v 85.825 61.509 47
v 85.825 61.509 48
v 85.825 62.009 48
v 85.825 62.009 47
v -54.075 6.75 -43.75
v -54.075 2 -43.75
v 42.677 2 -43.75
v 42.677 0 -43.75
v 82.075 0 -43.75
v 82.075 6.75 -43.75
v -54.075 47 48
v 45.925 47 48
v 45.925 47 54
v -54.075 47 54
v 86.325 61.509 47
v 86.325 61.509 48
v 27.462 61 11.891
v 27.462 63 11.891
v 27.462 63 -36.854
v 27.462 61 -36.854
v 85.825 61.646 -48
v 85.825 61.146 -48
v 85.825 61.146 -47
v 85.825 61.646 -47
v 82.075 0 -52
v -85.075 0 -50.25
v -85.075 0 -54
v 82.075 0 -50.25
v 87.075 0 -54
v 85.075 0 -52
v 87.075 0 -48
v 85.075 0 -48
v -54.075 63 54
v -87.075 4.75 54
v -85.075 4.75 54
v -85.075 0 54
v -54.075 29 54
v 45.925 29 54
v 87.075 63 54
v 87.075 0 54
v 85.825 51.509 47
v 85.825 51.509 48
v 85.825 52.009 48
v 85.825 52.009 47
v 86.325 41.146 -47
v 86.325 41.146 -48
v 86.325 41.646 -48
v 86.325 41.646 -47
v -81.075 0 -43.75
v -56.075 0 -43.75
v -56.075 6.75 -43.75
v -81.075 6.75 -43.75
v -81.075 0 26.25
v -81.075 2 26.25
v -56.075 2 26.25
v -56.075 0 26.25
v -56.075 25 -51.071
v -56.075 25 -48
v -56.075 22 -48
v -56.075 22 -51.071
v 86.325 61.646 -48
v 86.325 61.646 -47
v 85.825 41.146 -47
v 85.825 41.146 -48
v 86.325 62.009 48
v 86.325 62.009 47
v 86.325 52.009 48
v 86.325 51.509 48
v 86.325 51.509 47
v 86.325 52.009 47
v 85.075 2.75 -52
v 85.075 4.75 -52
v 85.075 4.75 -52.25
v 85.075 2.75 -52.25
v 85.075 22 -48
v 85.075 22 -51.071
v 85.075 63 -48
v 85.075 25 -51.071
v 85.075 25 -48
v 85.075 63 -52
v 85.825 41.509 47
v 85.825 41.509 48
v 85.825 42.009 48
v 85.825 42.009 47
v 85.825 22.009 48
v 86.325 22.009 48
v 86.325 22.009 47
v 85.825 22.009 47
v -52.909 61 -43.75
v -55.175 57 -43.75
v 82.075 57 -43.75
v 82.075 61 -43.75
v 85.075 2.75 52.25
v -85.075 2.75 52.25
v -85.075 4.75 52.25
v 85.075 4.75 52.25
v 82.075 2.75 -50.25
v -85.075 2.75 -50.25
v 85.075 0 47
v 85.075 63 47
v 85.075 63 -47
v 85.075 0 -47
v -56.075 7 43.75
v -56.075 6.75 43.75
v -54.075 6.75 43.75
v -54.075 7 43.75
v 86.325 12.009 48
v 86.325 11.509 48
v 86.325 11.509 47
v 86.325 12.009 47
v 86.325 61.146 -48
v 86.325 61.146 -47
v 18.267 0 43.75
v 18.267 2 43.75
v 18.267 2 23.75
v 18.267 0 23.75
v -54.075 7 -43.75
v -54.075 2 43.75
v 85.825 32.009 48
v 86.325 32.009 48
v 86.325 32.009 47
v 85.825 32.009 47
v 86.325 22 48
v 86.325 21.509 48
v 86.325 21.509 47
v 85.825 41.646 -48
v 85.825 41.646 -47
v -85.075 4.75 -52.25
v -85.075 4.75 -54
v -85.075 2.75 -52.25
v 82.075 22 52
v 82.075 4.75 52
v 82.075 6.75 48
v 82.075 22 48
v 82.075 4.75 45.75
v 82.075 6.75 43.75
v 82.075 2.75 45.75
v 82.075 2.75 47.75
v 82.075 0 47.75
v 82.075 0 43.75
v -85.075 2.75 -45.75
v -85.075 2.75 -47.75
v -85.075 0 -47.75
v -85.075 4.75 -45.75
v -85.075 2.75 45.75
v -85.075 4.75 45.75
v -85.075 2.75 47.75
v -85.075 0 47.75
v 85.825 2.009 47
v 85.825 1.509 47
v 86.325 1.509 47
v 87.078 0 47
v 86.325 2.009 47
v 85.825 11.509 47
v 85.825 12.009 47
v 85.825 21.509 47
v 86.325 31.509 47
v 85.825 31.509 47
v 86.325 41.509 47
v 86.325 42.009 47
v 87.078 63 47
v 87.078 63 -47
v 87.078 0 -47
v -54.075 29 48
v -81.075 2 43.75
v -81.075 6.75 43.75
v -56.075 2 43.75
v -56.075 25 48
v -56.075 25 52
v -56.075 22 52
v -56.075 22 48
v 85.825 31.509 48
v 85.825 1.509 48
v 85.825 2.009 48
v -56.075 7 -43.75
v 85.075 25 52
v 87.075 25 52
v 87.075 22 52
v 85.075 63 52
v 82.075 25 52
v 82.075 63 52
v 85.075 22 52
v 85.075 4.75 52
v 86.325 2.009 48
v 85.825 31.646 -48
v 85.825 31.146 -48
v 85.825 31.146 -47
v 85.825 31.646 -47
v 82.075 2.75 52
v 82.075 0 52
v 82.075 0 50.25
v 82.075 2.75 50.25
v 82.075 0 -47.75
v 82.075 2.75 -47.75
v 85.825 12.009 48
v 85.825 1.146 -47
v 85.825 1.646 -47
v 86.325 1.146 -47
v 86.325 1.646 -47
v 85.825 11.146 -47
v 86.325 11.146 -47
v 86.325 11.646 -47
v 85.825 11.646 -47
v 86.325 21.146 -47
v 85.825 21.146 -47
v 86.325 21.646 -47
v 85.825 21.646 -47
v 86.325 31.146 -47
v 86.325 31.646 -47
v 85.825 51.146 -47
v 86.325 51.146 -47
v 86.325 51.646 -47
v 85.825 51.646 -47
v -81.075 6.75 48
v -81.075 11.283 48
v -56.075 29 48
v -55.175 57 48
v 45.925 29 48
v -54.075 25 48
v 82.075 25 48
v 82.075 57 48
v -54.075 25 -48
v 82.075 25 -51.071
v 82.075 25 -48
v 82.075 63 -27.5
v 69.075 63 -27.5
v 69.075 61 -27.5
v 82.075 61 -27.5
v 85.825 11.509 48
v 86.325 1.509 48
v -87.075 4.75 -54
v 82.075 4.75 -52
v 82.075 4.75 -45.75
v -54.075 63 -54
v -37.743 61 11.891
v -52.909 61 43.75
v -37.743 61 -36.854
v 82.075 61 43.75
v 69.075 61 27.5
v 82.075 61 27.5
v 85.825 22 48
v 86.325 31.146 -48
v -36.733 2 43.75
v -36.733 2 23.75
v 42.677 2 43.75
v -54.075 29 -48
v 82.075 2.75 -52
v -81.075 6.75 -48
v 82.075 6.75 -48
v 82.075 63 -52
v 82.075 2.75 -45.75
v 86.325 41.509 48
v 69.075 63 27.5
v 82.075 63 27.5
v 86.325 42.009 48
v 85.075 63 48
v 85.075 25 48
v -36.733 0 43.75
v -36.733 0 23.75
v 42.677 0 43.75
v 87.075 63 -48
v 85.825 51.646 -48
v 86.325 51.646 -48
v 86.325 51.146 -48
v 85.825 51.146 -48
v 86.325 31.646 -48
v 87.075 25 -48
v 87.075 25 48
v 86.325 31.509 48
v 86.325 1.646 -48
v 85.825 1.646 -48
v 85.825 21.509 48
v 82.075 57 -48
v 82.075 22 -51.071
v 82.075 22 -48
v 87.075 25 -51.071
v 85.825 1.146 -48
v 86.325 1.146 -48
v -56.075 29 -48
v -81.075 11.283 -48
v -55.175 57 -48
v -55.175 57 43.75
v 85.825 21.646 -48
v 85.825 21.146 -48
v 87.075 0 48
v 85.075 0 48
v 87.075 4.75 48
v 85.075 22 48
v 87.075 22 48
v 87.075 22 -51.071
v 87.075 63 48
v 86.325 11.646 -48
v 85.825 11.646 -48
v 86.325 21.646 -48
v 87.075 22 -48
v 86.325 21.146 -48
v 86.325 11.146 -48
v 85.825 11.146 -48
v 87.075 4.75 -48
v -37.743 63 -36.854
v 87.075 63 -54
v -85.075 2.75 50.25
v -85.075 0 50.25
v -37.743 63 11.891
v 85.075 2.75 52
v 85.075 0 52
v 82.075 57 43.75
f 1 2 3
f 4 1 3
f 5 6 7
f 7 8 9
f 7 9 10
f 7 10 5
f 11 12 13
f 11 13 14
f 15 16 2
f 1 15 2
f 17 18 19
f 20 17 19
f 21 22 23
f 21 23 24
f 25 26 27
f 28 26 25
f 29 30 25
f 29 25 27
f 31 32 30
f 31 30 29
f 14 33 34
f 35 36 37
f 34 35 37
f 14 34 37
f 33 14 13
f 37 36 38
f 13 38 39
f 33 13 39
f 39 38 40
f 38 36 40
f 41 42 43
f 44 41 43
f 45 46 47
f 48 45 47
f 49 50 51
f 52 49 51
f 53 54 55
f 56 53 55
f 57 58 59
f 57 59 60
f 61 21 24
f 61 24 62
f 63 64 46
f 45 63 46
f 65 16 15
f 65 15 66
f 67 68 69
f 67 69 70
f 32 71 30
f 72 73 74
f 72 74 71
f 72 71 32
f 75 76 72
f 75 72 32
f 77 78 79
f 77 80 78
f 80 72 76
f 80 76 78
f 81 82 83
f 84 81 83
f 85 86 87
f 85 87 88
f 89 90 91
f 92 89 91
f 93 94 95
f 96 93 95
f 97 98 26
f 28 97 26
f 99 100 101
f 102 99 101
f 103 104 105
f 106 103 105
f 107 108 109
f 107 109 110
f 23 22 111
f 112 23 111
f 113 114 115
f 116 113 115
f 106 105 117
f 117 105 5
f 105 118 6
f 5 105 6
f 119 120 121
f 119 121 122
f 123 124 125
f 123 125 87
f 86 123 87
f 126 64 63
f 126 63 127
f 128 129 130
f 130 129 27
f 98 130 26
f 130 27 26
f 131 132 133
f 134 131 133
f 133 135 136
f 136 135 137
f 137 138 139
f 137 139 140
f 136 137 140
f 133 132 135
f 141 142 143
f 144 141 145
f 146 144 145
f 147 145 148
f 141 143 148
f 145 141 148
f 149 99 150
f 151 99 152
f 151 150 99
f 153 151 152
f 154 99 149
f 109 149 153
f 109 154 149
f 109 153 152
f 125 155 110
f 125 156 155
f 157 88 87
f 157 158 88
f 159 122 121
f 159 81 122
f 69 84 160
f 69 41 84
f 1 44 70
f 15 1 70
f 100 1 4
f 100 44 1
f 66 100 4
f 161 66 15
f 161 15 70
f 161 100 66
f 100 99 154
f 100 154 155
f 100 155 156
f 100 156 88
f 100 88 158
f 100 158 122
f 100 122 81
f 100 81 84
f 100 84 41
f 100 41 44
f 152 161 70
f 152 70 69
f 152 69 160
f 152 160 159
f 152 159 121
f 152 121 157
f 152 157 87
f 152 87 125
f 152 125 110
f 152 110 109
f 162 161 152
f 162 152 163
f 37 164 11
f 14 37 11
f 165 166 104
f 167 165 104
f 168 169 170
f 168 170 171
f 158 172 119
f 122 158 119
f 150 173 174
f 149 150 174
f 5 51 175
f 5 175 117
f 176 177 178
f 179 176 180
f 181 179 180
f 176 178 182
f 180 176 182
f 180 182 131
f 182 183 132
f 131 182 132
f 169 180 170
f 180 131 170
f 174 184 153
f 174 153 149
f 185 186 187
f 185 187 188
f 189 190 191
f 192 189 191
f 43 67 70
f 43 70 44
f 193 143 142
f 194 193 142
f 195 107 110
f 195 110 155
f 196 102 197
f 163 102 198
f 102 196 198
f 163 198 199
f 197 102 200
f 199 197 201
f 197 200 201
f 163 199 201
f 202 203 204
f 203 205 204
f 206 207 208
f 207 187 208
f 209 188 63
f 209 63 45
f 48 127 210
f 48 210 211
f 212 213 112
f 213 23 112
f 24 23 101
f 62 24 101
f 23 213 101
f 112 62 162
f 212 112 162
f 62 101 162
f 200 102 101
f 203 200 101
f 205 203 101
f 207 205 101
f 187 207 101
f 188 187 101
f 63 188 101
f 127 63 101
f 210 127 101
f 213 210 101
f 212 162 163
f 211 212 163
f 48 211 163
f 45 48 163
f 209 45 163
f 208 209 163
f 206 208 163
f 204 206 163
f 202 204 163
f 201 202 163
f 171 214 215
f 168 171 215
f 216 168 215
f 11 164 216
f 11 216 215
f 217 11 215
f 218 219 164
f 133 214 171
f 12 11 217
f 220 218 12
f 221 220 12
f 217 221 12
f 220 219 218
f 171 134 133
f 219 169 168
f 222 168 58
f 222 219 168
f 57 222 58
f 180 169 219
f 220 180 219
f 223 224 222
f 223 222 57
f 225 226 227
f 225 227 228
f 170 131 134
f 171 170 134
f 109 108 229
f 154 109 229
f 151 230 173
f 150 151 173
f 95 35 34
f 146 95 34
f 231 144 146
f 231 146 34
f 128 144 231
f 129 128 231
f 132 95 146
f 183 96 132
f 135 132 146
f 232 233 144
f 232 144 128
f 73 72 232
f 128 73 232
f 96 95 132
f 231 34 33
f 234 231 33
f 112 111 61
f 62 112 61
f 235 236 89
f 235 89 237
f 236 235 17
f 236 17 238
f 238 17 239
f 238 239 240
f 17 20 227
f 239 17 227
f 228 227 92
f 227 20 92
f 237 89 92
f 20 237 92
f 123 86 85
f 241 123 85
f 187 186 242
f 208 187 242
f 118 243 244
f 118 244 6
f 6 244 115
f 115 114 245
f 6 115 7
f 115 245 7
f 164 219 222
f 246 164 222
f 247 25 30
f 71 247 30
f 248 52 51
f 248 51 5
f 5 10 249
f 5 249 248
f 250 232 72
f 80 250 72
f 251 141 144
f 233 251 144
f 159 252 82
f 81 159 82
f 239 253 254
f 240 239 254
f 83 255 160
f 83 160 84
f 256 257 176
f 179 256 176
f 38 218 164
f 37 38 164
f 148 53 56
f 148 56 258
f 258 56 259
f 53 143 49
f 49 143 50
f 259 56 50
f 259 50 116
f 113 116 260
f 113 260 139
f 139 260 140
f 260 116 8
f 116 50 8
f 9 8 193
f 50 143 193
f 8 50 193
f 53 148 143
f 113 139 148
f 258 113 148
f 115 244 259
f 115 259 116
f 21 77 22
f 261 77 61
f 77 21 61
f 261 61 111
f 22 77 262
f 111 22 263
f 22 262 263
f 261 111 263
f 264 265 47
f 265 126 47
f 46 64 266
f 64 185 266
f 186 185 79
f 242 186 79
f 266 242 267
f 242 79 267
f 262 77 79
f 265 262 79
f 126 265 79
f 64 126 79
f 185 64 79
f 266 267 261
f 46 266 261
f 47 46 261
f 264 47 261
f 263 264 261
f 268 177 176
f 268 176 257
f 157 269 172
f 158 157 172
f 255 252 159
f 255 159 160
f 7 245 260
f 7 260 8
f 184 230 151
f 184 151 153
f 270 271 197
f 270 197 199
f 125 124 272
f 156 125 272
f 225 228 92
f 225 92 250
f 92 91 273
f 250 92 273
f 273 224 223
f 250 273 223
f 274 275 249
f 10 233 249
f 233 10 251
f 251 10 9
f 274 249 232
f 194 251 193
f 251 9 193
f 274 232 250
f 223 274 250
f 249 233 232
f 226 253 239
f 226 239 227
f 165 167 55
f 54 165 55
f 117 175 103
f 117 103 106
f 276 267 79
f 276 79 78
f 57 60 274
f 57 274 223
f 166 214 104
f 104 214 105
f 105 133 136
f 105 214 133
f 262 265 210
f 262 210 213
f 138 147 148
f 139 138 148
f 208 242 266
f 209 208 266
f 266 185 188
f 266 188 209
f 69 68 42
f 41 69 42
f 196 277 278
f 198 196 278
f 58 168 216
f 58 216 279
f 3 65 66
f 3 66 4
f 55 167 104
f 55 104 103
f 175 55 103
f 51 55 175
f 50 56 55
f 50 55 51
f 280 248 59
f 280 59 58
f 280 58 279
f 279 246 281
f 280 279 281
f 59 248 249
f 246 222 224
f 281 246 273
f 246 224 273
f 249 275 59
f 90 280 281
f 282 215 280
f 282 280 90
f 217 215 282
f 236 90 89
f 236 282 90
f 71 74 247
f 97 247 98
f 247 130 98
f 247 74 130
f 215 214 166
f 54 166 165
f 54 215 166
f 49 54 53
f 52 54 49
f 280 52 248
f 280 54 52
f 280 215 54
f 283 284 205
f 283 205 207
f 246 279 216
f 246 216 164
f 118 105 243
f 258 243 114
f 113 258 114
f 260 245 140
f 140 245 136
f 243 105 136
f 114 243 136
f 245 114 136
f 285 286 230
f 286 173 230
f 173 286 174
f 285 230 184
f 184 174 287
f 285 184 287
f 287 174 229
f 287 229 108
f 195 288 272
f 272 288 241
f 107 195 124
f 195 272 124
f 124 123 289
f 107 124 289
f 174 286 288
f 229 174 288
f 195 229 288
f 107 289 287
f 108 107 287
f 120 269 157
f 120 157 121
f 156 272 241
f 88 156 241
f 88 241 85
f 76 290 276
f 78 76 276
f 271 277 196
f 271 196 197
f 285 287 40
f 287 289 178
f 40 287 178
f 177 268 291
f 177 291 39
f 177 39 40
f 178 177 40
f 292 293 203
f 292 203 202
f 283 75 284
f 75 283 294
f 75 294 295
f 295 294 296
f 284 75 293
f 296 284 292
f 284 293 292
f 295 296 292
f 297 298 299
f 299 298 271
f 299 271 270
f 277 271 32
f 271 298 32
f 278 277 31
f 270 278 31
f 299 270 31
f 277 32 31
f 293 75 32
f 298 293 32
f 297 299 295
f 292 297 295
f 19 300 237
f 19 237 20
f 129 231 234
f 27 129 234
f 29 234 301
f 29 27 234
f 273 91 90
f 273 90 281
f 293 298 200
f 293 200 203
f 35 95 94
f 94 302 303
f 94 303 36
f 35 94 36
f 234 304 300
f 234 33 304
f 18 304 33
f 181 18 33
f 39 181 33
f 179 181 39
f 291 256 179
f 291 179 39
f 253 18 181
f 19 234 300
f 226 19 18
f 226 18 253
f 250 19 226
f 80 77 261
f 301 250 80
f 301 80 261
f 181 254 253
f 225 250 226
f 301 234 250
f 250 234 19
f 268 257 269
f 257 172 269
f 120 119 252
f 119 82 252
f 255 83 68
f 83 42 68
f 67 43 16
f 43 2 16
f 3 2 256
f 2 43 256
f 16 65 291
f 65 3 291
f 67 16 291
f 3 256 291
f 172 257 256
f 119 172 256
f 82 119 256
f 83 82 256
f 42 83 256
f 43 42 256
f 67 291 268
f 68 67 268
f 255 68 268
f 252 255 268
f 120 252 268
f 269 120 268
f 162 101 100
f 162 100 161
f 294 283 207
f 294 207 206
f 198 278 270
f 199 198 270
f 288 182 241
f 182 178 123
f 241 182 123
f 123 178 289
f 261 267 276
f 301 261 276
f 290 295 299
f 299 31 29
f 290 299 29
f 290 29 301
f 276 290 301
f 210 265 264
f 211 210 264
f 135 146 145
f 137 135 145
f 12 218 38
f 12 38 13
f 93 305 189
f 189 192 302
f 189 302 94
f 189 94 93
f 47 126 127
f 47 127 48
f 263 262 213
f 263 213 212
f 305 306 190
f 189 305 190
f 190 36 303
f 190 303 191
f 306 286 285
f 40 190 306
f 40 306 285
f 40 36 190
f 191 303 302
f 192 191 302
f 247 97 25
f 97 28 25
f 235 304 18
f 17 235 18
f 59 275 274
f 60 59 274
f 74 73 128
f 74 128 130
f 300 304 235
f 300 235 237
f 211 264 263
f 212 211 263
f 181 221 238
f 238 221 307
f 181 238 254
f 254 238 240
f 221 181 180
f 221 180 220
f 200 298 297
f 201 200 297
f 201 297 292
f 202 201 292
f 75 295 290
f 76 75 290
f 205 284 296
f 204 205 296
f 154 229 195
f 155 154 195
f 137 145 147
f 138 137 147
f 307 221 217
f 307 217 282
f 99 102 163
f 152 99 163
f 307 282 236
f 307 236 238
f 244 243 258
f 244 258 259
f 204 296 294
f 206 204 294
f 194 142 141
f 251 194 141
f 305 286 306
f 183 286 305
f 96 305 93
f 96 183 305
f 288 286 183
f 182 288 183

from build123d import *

# Parameters (mm, degrees)
SKETCH_1_W           = 174.15
SKETCH_1_H           = 108
EXTRUDE_1_DEPTH      = 63
CUT_EXTRUDE_2_DEPTH  = 174.15
CUT_EXTRUDE_3_REACH  = 122.279
SKETCH_6_W           = 2
SKETCH_6_H           = 108
SKETCH_7_W           = 96
SKETCH_7_H           = 50.25
CUT_EXTRUDE_5_DEPTH  = 168.15
SKETCH_8_W           = 87.5
SKETCH_8_H           = 4.75
CUT_EXTRUDE_6_DEPTH  = 168.15
SKETCH_10_W          = 168.15
SKETCH_10_H          = 87.5
CUT_EXTRUDE_8_DEPTH  = 59
SKETCH_12_W          = 168.15
SKETCH_12_H          = 96
EXTRUDE_2_DEPTH      = 2
SKETCH_15_W          = 25
SKETCH_15_H          = 70
SKETCH_15_W_2        = 55
SKETCH_15_H_2        = 20
SKETCH_15_W_3        = 44.398131355
SKETCH_15_H_3        = 87.5
CUT_EXTRUDE_9_DEPTH  = 2
SKETCH_16_W          = 25
SKETCH_16_H          = 96
SKETCH_16_W_2        = 32.283516817
CUT_EXTRUDE_10_DEPTH = 2
SKETCH_17_W          = 2
SKETCH_17_H          = 96
EXTRUDE_3_DEPTH      = 5
SKETCH_18_W          = 2
SKETCH_18_H          = 87.5
EXTRUDE_4_DEPTH      = 5
SKETCH_19_W          = 100
SKETCH_19_H          = 18
CUT_EXTRUDE_11_DEPTH = 6
CUT_EXTRUDE_12_REACH = 154.365
EXTRUDE_5_REACH      = 154.365
SKETCH_23_W          = 65.205598619
SKETCH_23_H          = 48.744694075
CUT_EXTRUDE_13_DEPTH = 2
CUT_EXTRUDE_START    = -63
CUT_EXTRUDE_14_DEPTH = 63
SKETCH_28_W          = 2
SKETCH_28_H          = 4.25
EXTRUDE_6_DEPTH      = 4.75
SKETCH_31_W          = 13
SKETCH_31_H          = 55
CUT_EXTRUDE_15_DEPTH = 10
SKETCH_34_W          = 103.070926165
SKETCH_34_H          = 3
CUT_EXTRUDE_16_DEPTH = 143.15
SKETCH_37_W          = 0.5
SKETCH_37_H          = 0.5
EXTRUDE_7_DEPTH      = 1
EXTRUDE_7_2_DEPTH    = 1
EXTRUDE_7_3_DEPTH    = 1
EXTRUDE_7_4_DEPTH    = 1
EXTRUDE_7_5_DEPTH    = 1
EXTRUDE_7_6_DEPTH    = 1
EXTRUDE_7_7_DEPTH    = 1
SKETCH_40_W          = 0.5
SKETCH_40_H          = 0.5
EXTRUDE_8_DEPTH      = 1
SKETCH_42_W          = 2.002594571
SKETCH_42_H          = 94
EXTRUDE_9_DEPTH      = 63


with BuildPart() as part:
    # 스케치1 → 보스-돌출1 (new body)
    with BuildSketch(Plane(origin=(0, 0, 0), x_dir=(1, 0, 0), z_dir=(0, 1, 0))):
        Rectangle(SKETCH_1_W, SKETCH_1_H)
    extrude(amount=EXTRUDE_1_DEPTH)

    # 스케치5 → 컷-돌출2 (cut)
    with BuildSketch(Plane.ZY.offset(87.075)):
        Polygon((-48, 0), (-47.75, 0), (-47.75, 2.75), (-45.75, 2.75), (-45.75, 4.75), (-52.25, 4.75), (-52.25, 2.75), (-50.25, 2.75), (-50.25, 0), (-50, 0), (-50, 3), (-52, 3), (-52, 4.5), (-46, 4.5), (-46, 3), (-48, 3), align=None)
        Polygon((-50, 0), (-48, 0), (-48, 3), (-46, 3), (-46, 4.5), (-52, 4.5), (-52, 3), (-50, 3), align=None)
        Polygon((50, 3), (50, 0), (50.25, 0), (50.25, 2.75), (52.25, 2.75), (52.25, 4.75), (45.75, 4.75), (45.75, 2.75), (47.75, 2.75), (47.75, 0), (48, 0), (48, 3), (46, 3), (46, 4.5), (52, 4.5), (52, 3), align=None)
        Polygon((48, 0), (50, 0), (50, 3), (52, 3), (52, 4.5), (46, 4.5), (46, 3), (48, 3), align=None)
    extrude(amount=-CUT_EXTRUDE_2_DEPTH, mode=Mode.SUBTRACT)

    # 컷-돌출3: up to this face of the body (flat: up to its plane)
    cut_extrude_3_end = Plane(part.part.faces().sort_by_distance((0, 4.75, 49))[0])
    # 스케치6 → 컷-돌출3 (cut, up to the picked face)
    with BuildSketch(Plane.XZ, mode=Mode.PRIVATE) as cut_extrude_3_sk1:
        with Locations((-86.075, 0)):
            Rectangle(SKETCH_6_W, SKETCH_6_H)
    cut_extrude_3_tool1 = split(extrude(cut_extrude_3_sk1.sketch, amount=-CUT_EXTRUDE_3_REACH, mode=Mode.PRIVATE), bisect_by=cut_extrude_3_end, keep=Keep.BOTH, mode=Mode.PRIVATE)
    add(cut_extrude_3_tool1.solids().sort_by(Axis((-86.075, 0, 0), (0, 1, 0)))[0], mode=Mode.SUBTRACT)

    # 스케치7 → 컷-돌출5 (cut)
    with BuildSketch(Plane(origin=(87.075, 0, 0), x_dir=(0, 0, -1), z_dir=(1, 0, 0))):
        with Locations((0, 31.875)):
            Rectangle(SKETCH_7_W, SKETCH_7_H)
    extrude(amount=-CUT_EXTRUDE_5_DEPTH, mode=Mode.SUBTRACT)

    # 스케치8 → 컷-돌출6 (cut)
    with BuildSketch(Plane(origin=(87.075, 0, 0), x_dir=(0, 0, -1), z_dir=(1, 0, 0))):
        with Locations((0, 4.375)):
            Rectangle(SKETCH_8_W, SKETCH_8_H)
    extrude(amount=-CUT_EXTRUDE_6_DEPTH, mode=Mode.SUBTRACT)

    # 스케치10 → 컷-돌출8 (cut)
    with BuildSketch(Plane(origin=(0, 2, 0), x_dir=(1, 0, 0), z_dir=(0, 1, 0))):
        with Locations((3, 0)):
            Rectangle(SKETCH_10_W, SKETCH_10_H)
    extrude(amount=CUT_EXTRUDE_8_DEPTH, mode=Mode.SUBTRACT)

    # 스케치12 → 보스-돌출2 (add)
    with BuildSketch(Plane(origin=(0, 24, 0), x_dir=(-1, 0, 0), z_dir=(0, -1, 0))):
        with Locations((-3, 0)):
            Rectangle(SKETCH_12_W, SKETCH_12_H)
    extrude(amount=EXTRUDE_2_DEPTH)

    # 스케치15 → 컷-돌출9 (cut)
    with BuildSketch(Plane(origin=(0, 2, 0), x_dir=(1, 0, 0), z_dir=(0, 1, 0))):
        with Locations((-68.575, 8.75)):
            Rectangle(SKETCH_15_W, SKETCH_15_H)
        with Locations((-9.233175572, -33.75)):
            Rectangle(SKETCH_15_W_2, SKETCH_15_H_2)
        with Locations((64.875934323, 0)):
            Rectangle(SKETCH_15_W_3, SKETCH_15_H_3)
    extrude(amount=-CUT_EXTRUDE_9_DEPTH, mode=Mode.SUBTRACT)

    # 스케치16 → 컷-돌출10 (cut)
    with BuildSketch(Plane(origin=(0, 24, 0), x_dir=(1, 0, 0), z_dir=(0, 1, 0))):
        with Locations((-68.575, 0)):
            Rectangle(SKETCH_16_W, SKETCH_16_H)
        with Locations((70.933241592, 0)):
            Rectangle(SKETCH_16_W_2, SKETCH_16_H)
    extrude(amount=-CUT_EXTRUDE_10_DEPTH, mode=Mode.SUBTRACT)

    # 스케치17 → 보스-돌출3 (add)
    with BuildSketch(Plane(origin=(0, 24, 0), x_dir=(1, 0, 0), z_dir=(0, 1, 0))):
        with Locations((-55.075, 0)):
            Rectangle(SKETCH_17_W, SKETCH_17_H)
    extrude(amount=EXTRUDE_3_DEPTH)

    # 스케치18 → 보스-돌출4 (add)
    with BuildSketch(Plane(origin=(0, 2, 0), x_dir=(1, 0, 0), z_dir=(0, 1, 0))):
        with Locations((-55.075, 0)):
            Rectangle(SKETCH_18_W, SKETCH_18_H)
    extrude(amount=EXTRUDE_4_DEPTH)

    # 스케치19 → 컷-돌출11 (cut)
    with BuildSketch(Plane(origin=(0, 0, 48), x_dir=(-1, 0, 0), z_dir=(0, 0, -1))):
        with Locations((4.075, 38)):
            Rectangle(SKETCH_19_W, SKETCH_19_H)
    extrude(amount=-CUT_EXTRUDE_11_DEPTH, mode=Mode.SUBTRACT)

    # 컷-돌출12: up to this face of the body (flat: up to its plane)
    cut_extrude_12_end = Plane(part.part.faces().sort_by_distance((0.074595533, 31.525240719, -54))[0])
    # 스케치20 → 컷-돌출12 (cut, up to the picked face)
    with BuildSketch(Plane.XY.offset(54), mode=Mode.PRIVATE) as cut_extrude_12_sk1:
        Polygon((-87.075, 4.75), (-54.075, 63), (-87.075, 63), align=None)
    cut_extrude_12_tool1 = split(extrude(cut_extrude_12_sk1.sketch, amount=-CUT_EXTRUDE_12_REACH, mode=Mode.PRIVATE), bisect_by=cut_extrude_12_end, keep=Keep.BOTH, mode=Mode.PRIVATE)
    add(cut_extrude_12_tool1.solids().sort_by(Axis((-76.075, 43.583333, 54), (0, 0, -1)))[0], mode=Mode.SUBTRACT)

    # 보스-돌출5: up to this face of the body (flat: up to its plane)
    extrude_5_end = Plane(part.part.faces().sort_by_distance((7.392919772, 30.366402897, -54))[0])
    # 스케치21 → 보스-돌출5 (add, up to the picked face)
    with BuildSketch(Plane.XY.offset(54), mode=Mode.PRIVATE) as extrude_5_sk1:
        Polygon((-87.075, 4.75), (-84.776349095, 4.75), (-51.776349095, 63), (-54.075, 63), align=None)
    extrude_5_tool1 = split(extrude(extrude_5_sk1.sketch, amount=-EXTRUDE_5_REACH, mode=Mode.PRIVATE), bisect_by=extrude_5_end, keep=Keep.BOTH, mode=Mode.PRIVATE)
    add(extrude_5_tool1.solids().sort_by(Axis((-69.425675, 33.875, 54), (0, 0, -1)))[0])

    # 스케치23 → 컷-돌출13 (cut)
    with BuildSketch(Plane(origin=(0, 63, 0), x_dir=(1, 0, 0), z_dir=(0, 1, 0))):
        with Locations((-5.140341164, 12.481591832)):
            Rectangle(SKETCH_23_W, SKETCH_23_H)
    extrude(amount=-CUT_EXTRUDE_13_DEPTH, mode=Mode.SUBTRACT)

    # 스케치26 → 컷-돌출14 (cut)
    with BuildSketch(Plane(origin=(0, 63, 0), x_dir=(1, 0, 0), z_dir=(0, 1, 0)).offset(CUT_EXTRUDE_START)):
        Polygon((82.075, 52), (85.075, 52), (85.075, 48), (87.075, 48), (87.075, -48), (85.075, -48), (85.075, -52), (82.075, -52), align=None)
    extrude(amount=CUT_EXTRUDE_14_DEPTH, mode=Mode.SUBTRACT)

    # 스케치28 → 보스-돌출6 (add)
    with BuildSketch(Plane.XZ.offset(-4.75)):
        with Locations((86.075, 50.125)):
            Rectangle(SKETCH_28_W, SKETCH_28_H)
        with Locations((86.075, -50.125)):
            Rectangle(SKETCH_28_W, SKETCH_28_H)
    extrude(amount=EXTRUDE_6_DEPTH)

    # 스케치31 → 컷-돌출15 (cut)
    with BuildSketch(Plane(origin=(0, 63, 0), x_dir=(1, 0, 0), z_dir=(0, 1, 0))):
        with Locations((75.575, 0)):
            Rectangle(SKETCH_31_W, SKETCH_31_H)
    extrude(amount=-CUT_EXTRUDE_15_DEPTH, mode=Mode.SUBTRACT)

    # 스케치34 → 컷-돌출16 (cut)
    with BuildSketch(Plane(origin=(87.075, 0, 0), x_dir=(0, 0, -1), z_dir=(1, 0, 0))):
        with Locations((-0.464536917, 23.5)):
            Rectangle(SKETCH_34_W, SKETCH_34_H)
    extrude(amount=-CUT_EXTRUDE_16_DEPTH, mode=Mode.SUBTRACT)

    # 스케치40 → 보스-돌출8 (add)
    with BuildSketch(Plane.XY.offset(-48)):
        with Locations((86.075, 61.396326998)):
            Rectangle(SKETCH_40_W, SKETCH_40_H)
        with Locations((86.075, 51.396326998)):
            Rectangle(SKETCH_40_W, SKETCH_40_H)
        with Locations((86.075, 41.396326998)):
            Rectangle(SKETCH_40_W, SKETCH_40_H)
        with Locations((86.075, 31.396326998)):
            Rectangle(SKETCH_40_W, SKETCH_40_H)
        with Locations((86.075, 21.396326998)):
            Rectangle(SKETCH_40_W, SKETCH_40_H)
        with Locations((86.075, 11.396326998)):
            Rectangle(SKETCH_40_W, SKETCH_40_H)
        with Locations((86.075, 1.396326998)):
            Rectangle(SKETCH_40_W, SKETCH_40_H)
    extrude(amount=EXTRUDE_8_DEPTH)



with BuildPart() as body_2:
    # 스케치37 → 보스-돌출7 (new body)
    with BuildSketch(Plane(origin=(0, 0, 48), x_dir=(-1, 0, 0), z_dir=(0, 0, -1))):
        with Locations((-86.075, 51.75934634)):
            Rectangle(SKETCH_37_W, SKETCH_37_H)
    extrude(amount=EXTRUDE_7_DEPTH)


with BuildPart() as body_3:
    # 스케치37 → Extrude 7 2 (new body)
    with BuildSketch(Plane(origin=(0, 0, 48), x_dir=(-1, 0, 0), z_dir=(0, 0, -1))):
        with Locations((-86.075, 61.75934634)):
            Rectangle(SKETCH_37_W, SKETCH_37_H)
    extrude(amount=EXTRUDE_7_2_DEPTH)


with BuildPart() as body_4:
    # 스케치37 → Extrude 7 3 (new body)
    with BuildSketch(Plane(origin=(0, 0, 48), x_dir=(-1, 0, 0), z_dir=(0, 0, -1))):
        with Locations((-86.075, 41.75934634)):
            Rectangle(SKETCH_37_W, SKETCH_37_H)
    extrude(amount=EXTRUDE_7_3_DEPTH)


with BuildPart() as body_5:
    # 스케치37 → Extrude 7 4 (new body)
    with BuildSketch(Plane(origin=(0, 0, 48), x_dir=(-1, 0, 0), z_dir=(0, 0, -1))):
        with Locations((-86.075, 31.75934634)):
            Rectangle(SKETCH_37_W, SKETCH_37_H)
    extrude(amount=EXTRUDE_7_4_DEPTH)


with BuildPart() as body_6:
    # 스케치37 → Extrude 7 5 (new body)
    with BuildSketch(Plane(origin=(0, 0, 48), x_dir=(-1, 0, 0), z_dir=(0, 0, -1))):
        with Locations((-86.075, 21.75934634)):
            Rectangle(SKETCH_37_W, SKETCH_37_H)
    extrude(amount=EXTRUDE_7_5_DEPTH)


with BuildPart() as body_7:
    # 스케치37 → Extrude 7 6 (new body)
    with BuildSketch(Plane(origin=(0, 0, 48), x_dir=(-1, 0, 0), z_dir=(0, 0, -1))):
        with Locations((-86.075, 11.75934634)):
            Rectangle(SKETCH_37_W, SKETCH_37_H)
    extrude(amount=EXTRUDE_7_6_DEPTH)


with BuildPart() as body_8:
    # 스케치37 → Extrude 7 7 (new body)
    with BuildSketch(Plane(origin=(0, 0, 48), x_dir=(-1, 0, 0), z_dir=(0, 0, -1))):
        with Locations((-86.075, 1.75934634)):
            Rectangle(SKETCH_37_W, SKETCH_37_H)
    extrude(amount=EXTRUDE_7_7_DEPTH)


with BuildPart() as part_1:
    add(part.part)

    add(body_2.part)  # 보스-돌출9 merges body 2

    add(body_3.part)  # 보스-돌출9 merges body 3

    add(body_4.part)  # 보스-돌출9 merges body 4

    add(body_5.part)  # 보스-돌출9 merges body 5

    add(body_6.part)  # 보스-돌출9 merges body 6

    add(body_7.part)  # 보스-돌출9 merges body 7

    add(body_8.part)  # 보스-돌출9 merges body 8
    # 스케치42 → 보스-돌출9 (add)
    with BuildSketch(Plane(origin=(0, 63, 0), x_dir=(1, 0, 0), z_dir=(0, 1, 0))):
        with Locations((86.076297286, 0)):
            Rectangle(SKETCH_42_W, SKETCH_42_H)
    extrude(amount=-EXTRUDE_9_DEPTH)


solid = part_1.part
